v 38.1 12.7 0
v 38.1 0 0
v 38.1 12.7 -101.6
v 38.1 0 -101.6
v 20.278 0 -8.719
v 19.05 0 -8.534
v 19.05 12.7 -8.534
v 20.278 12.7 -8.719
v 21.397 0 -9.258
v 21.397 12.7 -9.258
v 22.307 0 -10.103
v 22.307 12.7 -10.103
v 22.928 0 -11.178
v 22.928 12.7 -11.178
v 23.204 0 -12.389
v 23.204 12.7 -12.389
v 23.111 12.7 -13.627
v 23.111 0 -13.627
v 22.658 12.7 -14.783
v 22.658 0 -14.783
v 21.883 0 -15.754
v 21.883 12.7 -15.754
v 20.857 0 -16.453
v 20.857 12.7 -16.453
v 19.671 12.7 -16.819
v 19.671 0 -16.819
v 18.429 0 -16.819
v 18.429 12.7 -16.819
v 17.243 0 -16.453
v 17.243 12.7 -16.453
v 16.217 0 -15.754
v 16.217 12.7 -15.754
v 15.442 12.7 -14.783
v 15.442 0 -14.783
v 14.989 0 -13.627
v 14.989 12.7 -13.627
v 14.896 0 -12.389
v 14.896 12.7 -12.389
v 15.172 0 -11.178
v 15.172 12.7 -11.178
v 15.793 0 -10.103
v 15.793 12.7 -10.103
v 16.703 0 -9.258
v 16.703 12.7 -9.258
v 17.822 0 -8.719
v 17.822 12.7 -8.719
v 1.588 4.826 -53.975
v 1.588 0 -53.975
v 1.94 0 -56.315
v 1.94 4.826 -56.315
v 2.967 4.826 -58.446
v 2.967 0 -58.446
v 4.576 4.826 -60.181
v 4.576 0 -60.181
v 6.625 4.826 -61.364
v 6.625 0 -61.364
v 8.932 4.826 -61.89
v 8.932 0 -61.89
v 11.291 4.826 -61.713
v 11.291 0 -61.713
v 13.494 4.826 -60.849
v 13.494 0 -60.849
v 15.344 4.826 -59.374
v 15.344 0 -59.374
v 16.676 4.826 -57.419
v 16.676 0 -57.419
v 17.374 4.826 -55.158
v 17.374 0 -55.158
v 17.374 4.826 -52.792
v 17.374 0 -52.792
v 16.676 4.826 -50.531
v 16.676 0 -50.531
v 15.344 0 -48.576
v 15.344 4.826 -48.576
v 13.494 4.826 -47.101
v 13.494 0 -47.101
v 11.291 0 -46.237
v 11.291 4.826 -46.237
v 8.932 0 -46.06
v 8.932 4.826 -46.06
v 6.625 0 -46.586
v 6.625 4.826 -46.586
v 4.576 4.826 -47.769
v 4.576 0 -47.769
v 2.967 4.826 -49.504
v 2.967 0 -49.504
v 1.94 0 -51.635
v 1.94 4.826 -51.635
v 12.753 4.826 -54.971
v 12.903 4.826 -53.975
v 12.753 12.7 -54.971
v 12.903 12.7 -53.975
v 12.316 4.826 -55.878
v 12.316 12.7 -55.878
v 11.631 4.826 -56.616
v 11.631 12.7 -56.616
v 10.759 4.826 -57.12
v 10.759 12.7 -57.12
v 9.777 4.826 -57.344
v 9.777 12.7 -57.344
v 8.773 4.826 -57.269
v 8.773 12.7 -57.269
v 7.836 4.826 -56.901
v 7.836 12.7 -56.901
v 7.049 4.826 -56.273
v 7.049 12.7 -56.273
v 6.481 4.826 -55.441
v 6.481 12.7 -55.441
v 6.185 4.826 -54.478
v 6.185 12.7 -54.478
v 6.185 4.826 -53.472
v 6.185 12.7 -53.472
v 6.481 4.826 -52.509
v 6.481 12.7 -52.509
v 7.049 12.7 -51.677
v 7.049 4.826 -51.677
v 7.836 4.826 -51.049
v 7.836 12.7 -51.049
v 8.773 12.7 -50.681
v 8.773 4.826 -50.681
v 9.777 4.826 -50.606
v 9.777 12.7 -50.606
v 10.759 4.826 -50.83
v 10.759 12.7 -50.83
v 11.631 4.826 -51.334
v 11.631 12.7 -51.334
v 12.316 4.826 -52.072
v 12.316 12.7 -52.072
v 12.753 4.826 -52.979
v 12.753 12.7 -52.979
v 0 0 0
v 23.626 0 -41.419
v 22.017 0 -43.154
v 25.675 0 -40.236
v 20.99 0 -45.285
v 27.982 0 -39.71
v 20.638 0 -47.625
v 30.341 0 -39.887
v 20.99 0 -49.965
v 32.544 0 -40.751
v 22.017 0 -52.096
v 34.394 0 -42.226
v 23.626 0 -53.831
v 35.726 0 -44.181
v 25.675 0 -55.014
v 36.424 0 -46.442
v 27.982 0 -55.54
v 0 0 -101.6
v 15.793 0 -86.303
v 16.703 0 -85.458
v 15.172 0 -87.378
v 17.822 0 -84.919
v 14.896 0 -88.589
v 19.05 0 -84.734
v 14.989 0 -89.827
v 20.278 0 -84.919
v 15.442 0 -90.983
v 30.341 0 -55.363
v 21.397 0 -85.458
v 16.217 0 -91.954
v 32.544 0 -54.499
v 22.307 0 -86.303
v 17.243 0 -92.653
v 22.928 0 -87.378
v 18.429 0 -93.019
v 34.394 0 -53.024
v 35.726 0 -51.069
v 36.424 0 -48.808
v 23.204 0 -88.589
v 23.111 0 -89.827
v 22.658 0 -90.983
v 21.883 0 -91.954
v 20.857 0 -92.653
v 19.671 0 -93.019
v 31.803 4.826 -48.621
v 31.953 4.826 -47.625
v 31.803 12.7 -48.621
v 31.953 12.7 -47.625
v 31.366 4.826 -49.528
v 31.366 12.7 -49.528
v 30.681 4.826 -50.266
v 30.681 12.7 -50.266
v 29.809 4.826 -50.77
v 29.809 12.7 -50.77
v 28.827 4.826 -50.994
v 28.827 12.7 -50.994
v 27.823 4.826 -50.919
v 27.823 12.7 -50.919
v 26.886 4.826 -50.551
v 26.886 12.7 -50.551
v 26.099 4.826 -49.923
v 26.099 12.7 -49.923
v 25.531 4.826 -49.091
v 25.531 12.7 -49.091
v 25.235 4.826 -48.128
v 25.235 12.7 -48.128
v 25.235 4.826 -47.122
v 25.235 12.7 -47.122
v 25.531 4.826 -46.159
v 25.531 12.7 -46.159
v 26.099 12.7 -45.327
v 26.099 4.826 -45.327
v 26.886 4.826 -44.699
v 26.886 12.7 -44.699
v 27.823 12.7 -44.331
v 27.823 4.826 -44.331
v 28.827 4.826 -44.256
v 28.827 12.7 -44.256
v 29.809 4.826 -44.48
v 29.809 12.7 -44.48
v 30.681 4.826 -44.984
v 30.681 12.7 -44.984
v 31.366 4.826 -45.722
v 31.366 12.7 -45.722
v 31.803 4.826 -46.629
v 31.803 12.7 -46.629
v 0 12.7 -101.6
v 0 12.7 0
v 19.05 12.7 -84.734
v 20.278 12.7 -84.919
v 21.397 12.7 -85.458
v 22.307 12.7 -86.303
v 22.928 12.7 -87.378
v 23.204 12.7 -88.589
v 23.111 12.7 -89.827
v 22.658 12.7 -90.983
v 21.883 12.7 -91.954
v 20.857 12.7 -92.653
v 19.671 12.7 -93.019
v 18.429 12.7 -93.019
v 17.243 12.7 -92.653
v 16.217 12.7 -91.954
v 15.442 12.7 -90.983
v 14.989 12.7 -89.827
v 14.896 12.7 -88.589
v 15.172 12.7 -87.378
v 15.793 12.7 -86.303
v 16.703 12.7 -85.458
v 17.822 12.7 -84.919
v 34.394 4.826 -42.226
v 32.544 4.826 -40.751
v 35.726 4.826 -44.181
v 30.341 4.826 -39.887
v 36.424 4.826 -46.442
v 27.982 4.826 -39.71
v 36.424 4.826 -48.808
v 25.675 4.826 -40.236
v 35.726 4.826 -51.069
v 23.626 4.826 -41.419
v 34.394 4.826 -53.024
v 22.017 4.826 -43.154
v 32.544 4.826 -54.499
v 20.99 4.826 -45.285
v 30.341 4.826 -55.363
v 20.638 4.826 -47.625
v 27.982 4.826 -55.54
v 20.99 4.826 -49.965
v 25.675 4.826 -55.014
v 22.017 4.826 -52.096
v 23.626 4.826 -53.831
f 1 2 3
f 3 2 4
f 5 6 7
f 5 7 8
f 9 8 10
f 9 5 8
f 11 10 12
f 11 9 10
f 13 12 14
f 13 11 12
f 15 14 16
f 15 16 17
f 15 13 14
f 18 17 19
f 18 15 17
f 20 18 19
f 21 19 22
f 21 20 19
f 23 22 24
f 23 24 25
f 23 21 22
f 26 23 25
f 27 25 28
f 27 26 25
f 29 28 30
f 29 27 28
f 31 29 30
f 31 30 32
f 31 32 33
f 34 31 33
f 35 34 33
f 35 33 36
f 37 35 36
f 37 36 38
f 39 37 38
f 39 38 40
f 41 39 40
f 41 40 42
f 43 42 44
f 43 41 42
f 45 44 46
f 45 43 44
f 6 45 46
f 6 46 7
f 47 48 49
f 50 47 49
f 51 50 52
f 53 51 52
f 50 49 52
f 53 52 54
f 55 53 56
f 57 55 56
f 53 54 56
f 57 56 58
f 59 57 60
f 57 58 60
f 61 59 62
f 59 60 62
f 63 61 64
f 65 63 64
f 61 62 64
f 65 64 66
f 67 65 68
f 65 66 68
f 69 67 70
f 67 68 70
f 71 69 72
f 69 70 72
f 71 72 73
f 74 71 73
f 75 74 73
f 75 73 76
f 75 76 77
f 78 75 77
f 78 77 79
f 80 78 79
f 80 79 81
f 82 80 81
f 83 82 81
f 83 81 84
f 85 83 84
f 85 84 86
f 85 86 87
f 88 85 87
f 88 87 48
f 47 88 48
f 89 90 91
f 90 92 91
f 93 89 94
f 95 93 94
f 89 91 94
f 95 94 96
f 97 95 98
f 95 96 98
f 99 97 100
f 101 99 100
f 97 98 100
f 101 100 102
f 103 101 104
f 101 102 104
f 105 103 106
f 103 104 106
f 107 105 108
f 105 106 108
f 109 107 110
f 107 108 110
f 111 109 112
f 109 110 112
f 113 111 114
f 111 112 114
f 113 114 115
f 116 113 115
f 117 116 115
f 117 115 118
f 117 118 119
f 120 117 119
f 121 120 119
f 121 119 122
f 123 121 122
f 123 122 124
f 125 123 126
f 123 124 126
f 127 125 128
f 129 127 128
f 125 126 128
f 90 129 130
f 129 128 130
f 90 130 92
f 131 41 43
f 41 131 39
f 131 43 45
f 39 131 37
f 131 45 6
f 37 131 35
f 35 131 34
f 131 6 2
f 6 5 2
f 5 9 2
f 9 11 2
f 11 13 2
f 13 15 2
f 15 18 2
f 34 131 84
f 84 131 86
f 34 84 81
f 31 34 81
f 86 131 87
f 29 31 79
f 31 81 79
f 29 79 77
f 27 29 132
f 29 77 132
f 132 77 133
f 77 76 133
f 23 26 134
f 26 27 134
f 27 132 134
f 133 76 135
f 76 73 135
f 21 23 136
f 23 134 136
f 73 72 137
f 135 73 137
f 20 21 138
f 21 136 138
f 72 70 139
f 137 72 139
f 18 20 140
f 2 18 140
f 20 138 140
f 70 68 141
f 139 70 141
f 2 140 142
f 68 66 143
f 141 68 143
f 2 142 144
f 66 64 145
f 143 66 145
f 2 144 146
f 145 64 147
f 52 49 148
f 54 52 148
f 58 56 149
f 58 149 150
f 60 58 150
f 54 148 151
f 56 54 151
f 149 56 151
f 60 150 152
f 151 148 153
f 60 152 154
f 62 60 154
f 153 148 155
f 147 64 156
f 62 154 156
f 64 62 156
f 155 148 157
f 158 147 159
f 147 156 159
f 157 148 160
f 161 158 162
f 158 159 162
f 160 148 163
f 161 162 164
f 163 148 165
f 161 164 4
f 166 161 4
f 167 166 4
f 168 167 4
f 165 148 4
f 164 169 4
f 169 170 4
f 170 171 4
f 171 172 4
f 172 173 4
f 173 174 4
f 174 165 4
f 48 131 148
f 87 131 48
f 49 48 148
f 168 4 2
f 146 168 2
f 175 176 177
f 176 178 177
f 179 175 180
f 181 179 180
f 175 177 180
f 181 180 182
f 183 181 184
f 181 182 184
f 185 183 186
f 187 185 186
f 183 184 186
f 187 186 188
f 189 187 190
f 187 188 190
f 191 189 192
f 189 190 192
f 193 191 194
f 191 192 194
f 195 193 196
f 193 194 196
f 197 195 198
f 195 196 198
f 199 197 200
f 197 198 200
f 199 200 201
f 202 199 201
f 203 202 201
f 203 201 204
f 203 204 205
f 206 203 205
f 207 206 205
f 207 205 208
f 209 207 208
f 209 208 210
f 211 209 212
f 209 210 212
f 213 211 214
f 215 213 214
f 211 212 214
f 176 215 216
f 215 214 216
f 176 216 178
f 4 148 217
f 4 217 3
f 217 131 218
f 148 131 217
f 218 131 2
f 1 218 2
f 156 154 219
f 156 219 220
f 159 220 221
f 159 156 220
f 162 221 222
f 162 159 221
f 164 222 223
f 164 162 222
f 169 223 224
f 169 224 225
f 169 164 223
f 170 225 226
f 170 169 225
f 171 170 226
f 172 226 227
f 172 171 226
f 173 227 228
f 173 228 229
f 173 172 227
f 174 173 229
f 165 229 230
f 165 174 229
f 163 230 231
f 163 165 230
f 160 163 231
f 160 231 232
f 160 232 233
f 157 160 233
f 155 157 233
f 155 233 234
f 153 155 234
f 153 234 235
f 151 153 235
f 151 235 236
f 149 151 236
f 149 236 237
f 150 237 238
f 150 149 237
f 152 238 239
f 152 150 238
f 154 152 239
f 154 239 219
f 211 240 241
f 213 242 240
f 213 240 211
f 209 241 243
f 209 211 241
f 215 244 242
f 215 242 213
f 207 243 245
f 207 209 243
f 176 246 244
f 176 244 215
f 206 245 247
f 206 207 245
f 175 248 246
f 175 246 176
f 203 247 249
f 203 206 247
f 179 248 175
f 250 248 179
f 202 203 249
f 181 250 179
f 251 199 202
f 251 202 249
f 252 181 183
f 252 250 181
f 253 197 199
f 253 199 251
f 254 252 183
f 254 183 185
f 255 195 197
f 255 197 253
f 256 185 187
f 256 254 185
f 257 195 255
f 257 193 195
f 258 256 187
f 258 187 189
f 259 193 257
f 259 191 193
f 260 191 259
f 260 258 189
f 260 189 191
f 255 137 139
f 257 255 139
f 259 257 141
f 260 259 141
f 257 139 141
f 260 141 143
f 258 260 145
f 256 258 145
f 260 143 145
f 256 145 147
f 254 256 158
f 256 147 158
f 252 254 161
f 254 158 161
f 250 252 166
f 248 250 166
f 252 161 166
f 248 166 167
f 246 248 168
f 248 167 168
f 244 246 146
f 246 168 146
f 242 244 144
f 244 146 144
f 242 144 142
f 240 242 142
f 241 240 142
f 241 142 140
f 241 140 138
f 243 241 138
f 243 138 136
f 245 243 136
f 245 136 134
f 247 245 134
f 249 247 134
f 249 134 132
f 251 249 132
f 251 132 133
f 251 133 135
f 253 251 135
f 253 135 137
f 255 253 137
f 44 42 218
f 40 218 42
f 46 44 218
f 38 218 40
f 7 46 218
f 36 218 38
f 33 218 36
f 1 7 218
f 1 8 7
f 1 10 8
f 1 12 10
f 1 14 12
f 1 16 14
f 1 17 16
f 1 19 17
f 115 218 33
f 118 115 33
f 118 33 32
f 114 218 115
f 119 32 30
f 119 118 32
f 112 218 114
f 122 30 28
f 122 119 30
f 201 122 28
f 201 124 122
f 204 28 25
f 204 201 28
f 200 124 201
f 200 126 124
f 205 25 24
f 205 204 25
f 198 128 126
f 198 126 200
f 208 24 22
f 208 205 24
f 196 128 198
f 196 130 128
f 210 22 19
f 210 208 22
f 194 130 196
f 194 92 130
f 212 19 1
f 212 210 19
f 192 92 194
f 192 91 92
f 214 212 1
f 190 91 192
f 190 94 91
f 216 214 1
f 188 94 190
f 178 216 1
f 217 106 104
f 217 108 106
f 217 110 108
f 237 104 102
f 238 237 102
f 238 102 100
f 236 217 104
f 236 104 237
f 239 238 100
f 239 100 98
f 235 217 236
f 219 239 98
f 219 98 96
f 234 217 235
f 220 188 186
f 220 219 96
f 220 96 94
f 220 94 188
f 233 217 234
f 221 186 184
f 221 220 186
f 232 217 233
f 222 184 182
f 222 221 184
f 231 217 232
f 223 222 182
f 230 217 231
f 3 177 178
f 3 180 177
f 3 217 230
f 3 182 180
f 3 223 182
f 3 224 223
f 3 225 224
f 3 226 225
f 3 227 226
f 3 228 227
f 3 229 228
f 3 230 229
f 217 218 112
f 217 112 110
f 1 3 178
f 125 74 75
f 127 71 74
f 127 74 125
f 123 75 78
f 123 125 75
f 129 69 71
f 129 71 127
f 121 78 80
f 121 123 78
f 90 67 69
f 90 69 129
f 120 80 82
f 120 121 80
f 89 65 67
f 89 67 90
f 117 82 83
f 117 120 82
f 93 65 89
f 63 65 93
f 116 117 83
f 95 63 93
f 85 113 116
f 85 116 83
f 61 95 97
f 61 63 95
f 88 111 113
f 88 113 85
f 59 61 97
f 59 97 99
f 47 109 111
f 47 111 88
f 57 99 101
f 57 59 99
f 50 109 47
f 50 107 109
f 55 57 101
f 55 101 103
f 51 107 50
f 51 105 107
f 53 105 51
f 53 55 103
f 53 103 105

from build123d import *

# Parameters (mm, degrees)
SKETCH1_W                                    = 38.1
SKETCH1_H                                    = 101.6
SKETCH1_R                                    = 4.1656
BOSS_EXTRUDE1_DEPTH                          = 12.7
CBORE_FOR_1_4_HEX_MACHINE_SCREW1_D           = 6.7564
CBORE_FOR_1_4_HEX_MACHINE_SCREW1_CBORE_D     = 15.875
CBORE_FOR_1_4_HEX_MACHINE_SCREW1_CBORE_DEPTH = 4.826


with BuildPart() as part:
    # Sketch1 → Boss-Extrude1 (new body)
    with BuildSketch(Plane(origin=(0, 0, 0), x_dir=(1, 0, 0), z_dir=(0, 1, 0))):
        with Locations((19.05, 50.8)):
            Rectangle(SKETCH1_W, SKETCH1_H)
        with Locations(Location((19.05, 88.9, 0), (0, 0, 270))):
            Circle(SKETCH1_R, mode=Mode.SUBTRACT)
        with Locations(Location((19.05, 12.7, 0), (0, 0, 270))):
            Circle(SKETCH1_R, mode=Mode.SUBTRACT)
    extrude(amount=BOSS_EXTRUDE1_DEPTH)

    # CBORE for 1/4 Hex Machine Screw1 (through all)
    with Locations(Plane(origin=(0, 0, 0), x_dir=(-1, 0, 0), z_dir=(0, -1, 0))):
        with Locations((-28.575, 47.625), (-9.525, 53.975)):
            CounterBoreHole(CBORE_FOR_1_4_HEX_MACHINE_SCREW1_D / 2, CBORE_FOR_1_4_HEX_MACHINE_SCREW1_CBORE_D / 2, CBORE_FOR_1_4_HEX_MACHINE_SCREW1_CBORE_DEPTH)


solid = part.part
